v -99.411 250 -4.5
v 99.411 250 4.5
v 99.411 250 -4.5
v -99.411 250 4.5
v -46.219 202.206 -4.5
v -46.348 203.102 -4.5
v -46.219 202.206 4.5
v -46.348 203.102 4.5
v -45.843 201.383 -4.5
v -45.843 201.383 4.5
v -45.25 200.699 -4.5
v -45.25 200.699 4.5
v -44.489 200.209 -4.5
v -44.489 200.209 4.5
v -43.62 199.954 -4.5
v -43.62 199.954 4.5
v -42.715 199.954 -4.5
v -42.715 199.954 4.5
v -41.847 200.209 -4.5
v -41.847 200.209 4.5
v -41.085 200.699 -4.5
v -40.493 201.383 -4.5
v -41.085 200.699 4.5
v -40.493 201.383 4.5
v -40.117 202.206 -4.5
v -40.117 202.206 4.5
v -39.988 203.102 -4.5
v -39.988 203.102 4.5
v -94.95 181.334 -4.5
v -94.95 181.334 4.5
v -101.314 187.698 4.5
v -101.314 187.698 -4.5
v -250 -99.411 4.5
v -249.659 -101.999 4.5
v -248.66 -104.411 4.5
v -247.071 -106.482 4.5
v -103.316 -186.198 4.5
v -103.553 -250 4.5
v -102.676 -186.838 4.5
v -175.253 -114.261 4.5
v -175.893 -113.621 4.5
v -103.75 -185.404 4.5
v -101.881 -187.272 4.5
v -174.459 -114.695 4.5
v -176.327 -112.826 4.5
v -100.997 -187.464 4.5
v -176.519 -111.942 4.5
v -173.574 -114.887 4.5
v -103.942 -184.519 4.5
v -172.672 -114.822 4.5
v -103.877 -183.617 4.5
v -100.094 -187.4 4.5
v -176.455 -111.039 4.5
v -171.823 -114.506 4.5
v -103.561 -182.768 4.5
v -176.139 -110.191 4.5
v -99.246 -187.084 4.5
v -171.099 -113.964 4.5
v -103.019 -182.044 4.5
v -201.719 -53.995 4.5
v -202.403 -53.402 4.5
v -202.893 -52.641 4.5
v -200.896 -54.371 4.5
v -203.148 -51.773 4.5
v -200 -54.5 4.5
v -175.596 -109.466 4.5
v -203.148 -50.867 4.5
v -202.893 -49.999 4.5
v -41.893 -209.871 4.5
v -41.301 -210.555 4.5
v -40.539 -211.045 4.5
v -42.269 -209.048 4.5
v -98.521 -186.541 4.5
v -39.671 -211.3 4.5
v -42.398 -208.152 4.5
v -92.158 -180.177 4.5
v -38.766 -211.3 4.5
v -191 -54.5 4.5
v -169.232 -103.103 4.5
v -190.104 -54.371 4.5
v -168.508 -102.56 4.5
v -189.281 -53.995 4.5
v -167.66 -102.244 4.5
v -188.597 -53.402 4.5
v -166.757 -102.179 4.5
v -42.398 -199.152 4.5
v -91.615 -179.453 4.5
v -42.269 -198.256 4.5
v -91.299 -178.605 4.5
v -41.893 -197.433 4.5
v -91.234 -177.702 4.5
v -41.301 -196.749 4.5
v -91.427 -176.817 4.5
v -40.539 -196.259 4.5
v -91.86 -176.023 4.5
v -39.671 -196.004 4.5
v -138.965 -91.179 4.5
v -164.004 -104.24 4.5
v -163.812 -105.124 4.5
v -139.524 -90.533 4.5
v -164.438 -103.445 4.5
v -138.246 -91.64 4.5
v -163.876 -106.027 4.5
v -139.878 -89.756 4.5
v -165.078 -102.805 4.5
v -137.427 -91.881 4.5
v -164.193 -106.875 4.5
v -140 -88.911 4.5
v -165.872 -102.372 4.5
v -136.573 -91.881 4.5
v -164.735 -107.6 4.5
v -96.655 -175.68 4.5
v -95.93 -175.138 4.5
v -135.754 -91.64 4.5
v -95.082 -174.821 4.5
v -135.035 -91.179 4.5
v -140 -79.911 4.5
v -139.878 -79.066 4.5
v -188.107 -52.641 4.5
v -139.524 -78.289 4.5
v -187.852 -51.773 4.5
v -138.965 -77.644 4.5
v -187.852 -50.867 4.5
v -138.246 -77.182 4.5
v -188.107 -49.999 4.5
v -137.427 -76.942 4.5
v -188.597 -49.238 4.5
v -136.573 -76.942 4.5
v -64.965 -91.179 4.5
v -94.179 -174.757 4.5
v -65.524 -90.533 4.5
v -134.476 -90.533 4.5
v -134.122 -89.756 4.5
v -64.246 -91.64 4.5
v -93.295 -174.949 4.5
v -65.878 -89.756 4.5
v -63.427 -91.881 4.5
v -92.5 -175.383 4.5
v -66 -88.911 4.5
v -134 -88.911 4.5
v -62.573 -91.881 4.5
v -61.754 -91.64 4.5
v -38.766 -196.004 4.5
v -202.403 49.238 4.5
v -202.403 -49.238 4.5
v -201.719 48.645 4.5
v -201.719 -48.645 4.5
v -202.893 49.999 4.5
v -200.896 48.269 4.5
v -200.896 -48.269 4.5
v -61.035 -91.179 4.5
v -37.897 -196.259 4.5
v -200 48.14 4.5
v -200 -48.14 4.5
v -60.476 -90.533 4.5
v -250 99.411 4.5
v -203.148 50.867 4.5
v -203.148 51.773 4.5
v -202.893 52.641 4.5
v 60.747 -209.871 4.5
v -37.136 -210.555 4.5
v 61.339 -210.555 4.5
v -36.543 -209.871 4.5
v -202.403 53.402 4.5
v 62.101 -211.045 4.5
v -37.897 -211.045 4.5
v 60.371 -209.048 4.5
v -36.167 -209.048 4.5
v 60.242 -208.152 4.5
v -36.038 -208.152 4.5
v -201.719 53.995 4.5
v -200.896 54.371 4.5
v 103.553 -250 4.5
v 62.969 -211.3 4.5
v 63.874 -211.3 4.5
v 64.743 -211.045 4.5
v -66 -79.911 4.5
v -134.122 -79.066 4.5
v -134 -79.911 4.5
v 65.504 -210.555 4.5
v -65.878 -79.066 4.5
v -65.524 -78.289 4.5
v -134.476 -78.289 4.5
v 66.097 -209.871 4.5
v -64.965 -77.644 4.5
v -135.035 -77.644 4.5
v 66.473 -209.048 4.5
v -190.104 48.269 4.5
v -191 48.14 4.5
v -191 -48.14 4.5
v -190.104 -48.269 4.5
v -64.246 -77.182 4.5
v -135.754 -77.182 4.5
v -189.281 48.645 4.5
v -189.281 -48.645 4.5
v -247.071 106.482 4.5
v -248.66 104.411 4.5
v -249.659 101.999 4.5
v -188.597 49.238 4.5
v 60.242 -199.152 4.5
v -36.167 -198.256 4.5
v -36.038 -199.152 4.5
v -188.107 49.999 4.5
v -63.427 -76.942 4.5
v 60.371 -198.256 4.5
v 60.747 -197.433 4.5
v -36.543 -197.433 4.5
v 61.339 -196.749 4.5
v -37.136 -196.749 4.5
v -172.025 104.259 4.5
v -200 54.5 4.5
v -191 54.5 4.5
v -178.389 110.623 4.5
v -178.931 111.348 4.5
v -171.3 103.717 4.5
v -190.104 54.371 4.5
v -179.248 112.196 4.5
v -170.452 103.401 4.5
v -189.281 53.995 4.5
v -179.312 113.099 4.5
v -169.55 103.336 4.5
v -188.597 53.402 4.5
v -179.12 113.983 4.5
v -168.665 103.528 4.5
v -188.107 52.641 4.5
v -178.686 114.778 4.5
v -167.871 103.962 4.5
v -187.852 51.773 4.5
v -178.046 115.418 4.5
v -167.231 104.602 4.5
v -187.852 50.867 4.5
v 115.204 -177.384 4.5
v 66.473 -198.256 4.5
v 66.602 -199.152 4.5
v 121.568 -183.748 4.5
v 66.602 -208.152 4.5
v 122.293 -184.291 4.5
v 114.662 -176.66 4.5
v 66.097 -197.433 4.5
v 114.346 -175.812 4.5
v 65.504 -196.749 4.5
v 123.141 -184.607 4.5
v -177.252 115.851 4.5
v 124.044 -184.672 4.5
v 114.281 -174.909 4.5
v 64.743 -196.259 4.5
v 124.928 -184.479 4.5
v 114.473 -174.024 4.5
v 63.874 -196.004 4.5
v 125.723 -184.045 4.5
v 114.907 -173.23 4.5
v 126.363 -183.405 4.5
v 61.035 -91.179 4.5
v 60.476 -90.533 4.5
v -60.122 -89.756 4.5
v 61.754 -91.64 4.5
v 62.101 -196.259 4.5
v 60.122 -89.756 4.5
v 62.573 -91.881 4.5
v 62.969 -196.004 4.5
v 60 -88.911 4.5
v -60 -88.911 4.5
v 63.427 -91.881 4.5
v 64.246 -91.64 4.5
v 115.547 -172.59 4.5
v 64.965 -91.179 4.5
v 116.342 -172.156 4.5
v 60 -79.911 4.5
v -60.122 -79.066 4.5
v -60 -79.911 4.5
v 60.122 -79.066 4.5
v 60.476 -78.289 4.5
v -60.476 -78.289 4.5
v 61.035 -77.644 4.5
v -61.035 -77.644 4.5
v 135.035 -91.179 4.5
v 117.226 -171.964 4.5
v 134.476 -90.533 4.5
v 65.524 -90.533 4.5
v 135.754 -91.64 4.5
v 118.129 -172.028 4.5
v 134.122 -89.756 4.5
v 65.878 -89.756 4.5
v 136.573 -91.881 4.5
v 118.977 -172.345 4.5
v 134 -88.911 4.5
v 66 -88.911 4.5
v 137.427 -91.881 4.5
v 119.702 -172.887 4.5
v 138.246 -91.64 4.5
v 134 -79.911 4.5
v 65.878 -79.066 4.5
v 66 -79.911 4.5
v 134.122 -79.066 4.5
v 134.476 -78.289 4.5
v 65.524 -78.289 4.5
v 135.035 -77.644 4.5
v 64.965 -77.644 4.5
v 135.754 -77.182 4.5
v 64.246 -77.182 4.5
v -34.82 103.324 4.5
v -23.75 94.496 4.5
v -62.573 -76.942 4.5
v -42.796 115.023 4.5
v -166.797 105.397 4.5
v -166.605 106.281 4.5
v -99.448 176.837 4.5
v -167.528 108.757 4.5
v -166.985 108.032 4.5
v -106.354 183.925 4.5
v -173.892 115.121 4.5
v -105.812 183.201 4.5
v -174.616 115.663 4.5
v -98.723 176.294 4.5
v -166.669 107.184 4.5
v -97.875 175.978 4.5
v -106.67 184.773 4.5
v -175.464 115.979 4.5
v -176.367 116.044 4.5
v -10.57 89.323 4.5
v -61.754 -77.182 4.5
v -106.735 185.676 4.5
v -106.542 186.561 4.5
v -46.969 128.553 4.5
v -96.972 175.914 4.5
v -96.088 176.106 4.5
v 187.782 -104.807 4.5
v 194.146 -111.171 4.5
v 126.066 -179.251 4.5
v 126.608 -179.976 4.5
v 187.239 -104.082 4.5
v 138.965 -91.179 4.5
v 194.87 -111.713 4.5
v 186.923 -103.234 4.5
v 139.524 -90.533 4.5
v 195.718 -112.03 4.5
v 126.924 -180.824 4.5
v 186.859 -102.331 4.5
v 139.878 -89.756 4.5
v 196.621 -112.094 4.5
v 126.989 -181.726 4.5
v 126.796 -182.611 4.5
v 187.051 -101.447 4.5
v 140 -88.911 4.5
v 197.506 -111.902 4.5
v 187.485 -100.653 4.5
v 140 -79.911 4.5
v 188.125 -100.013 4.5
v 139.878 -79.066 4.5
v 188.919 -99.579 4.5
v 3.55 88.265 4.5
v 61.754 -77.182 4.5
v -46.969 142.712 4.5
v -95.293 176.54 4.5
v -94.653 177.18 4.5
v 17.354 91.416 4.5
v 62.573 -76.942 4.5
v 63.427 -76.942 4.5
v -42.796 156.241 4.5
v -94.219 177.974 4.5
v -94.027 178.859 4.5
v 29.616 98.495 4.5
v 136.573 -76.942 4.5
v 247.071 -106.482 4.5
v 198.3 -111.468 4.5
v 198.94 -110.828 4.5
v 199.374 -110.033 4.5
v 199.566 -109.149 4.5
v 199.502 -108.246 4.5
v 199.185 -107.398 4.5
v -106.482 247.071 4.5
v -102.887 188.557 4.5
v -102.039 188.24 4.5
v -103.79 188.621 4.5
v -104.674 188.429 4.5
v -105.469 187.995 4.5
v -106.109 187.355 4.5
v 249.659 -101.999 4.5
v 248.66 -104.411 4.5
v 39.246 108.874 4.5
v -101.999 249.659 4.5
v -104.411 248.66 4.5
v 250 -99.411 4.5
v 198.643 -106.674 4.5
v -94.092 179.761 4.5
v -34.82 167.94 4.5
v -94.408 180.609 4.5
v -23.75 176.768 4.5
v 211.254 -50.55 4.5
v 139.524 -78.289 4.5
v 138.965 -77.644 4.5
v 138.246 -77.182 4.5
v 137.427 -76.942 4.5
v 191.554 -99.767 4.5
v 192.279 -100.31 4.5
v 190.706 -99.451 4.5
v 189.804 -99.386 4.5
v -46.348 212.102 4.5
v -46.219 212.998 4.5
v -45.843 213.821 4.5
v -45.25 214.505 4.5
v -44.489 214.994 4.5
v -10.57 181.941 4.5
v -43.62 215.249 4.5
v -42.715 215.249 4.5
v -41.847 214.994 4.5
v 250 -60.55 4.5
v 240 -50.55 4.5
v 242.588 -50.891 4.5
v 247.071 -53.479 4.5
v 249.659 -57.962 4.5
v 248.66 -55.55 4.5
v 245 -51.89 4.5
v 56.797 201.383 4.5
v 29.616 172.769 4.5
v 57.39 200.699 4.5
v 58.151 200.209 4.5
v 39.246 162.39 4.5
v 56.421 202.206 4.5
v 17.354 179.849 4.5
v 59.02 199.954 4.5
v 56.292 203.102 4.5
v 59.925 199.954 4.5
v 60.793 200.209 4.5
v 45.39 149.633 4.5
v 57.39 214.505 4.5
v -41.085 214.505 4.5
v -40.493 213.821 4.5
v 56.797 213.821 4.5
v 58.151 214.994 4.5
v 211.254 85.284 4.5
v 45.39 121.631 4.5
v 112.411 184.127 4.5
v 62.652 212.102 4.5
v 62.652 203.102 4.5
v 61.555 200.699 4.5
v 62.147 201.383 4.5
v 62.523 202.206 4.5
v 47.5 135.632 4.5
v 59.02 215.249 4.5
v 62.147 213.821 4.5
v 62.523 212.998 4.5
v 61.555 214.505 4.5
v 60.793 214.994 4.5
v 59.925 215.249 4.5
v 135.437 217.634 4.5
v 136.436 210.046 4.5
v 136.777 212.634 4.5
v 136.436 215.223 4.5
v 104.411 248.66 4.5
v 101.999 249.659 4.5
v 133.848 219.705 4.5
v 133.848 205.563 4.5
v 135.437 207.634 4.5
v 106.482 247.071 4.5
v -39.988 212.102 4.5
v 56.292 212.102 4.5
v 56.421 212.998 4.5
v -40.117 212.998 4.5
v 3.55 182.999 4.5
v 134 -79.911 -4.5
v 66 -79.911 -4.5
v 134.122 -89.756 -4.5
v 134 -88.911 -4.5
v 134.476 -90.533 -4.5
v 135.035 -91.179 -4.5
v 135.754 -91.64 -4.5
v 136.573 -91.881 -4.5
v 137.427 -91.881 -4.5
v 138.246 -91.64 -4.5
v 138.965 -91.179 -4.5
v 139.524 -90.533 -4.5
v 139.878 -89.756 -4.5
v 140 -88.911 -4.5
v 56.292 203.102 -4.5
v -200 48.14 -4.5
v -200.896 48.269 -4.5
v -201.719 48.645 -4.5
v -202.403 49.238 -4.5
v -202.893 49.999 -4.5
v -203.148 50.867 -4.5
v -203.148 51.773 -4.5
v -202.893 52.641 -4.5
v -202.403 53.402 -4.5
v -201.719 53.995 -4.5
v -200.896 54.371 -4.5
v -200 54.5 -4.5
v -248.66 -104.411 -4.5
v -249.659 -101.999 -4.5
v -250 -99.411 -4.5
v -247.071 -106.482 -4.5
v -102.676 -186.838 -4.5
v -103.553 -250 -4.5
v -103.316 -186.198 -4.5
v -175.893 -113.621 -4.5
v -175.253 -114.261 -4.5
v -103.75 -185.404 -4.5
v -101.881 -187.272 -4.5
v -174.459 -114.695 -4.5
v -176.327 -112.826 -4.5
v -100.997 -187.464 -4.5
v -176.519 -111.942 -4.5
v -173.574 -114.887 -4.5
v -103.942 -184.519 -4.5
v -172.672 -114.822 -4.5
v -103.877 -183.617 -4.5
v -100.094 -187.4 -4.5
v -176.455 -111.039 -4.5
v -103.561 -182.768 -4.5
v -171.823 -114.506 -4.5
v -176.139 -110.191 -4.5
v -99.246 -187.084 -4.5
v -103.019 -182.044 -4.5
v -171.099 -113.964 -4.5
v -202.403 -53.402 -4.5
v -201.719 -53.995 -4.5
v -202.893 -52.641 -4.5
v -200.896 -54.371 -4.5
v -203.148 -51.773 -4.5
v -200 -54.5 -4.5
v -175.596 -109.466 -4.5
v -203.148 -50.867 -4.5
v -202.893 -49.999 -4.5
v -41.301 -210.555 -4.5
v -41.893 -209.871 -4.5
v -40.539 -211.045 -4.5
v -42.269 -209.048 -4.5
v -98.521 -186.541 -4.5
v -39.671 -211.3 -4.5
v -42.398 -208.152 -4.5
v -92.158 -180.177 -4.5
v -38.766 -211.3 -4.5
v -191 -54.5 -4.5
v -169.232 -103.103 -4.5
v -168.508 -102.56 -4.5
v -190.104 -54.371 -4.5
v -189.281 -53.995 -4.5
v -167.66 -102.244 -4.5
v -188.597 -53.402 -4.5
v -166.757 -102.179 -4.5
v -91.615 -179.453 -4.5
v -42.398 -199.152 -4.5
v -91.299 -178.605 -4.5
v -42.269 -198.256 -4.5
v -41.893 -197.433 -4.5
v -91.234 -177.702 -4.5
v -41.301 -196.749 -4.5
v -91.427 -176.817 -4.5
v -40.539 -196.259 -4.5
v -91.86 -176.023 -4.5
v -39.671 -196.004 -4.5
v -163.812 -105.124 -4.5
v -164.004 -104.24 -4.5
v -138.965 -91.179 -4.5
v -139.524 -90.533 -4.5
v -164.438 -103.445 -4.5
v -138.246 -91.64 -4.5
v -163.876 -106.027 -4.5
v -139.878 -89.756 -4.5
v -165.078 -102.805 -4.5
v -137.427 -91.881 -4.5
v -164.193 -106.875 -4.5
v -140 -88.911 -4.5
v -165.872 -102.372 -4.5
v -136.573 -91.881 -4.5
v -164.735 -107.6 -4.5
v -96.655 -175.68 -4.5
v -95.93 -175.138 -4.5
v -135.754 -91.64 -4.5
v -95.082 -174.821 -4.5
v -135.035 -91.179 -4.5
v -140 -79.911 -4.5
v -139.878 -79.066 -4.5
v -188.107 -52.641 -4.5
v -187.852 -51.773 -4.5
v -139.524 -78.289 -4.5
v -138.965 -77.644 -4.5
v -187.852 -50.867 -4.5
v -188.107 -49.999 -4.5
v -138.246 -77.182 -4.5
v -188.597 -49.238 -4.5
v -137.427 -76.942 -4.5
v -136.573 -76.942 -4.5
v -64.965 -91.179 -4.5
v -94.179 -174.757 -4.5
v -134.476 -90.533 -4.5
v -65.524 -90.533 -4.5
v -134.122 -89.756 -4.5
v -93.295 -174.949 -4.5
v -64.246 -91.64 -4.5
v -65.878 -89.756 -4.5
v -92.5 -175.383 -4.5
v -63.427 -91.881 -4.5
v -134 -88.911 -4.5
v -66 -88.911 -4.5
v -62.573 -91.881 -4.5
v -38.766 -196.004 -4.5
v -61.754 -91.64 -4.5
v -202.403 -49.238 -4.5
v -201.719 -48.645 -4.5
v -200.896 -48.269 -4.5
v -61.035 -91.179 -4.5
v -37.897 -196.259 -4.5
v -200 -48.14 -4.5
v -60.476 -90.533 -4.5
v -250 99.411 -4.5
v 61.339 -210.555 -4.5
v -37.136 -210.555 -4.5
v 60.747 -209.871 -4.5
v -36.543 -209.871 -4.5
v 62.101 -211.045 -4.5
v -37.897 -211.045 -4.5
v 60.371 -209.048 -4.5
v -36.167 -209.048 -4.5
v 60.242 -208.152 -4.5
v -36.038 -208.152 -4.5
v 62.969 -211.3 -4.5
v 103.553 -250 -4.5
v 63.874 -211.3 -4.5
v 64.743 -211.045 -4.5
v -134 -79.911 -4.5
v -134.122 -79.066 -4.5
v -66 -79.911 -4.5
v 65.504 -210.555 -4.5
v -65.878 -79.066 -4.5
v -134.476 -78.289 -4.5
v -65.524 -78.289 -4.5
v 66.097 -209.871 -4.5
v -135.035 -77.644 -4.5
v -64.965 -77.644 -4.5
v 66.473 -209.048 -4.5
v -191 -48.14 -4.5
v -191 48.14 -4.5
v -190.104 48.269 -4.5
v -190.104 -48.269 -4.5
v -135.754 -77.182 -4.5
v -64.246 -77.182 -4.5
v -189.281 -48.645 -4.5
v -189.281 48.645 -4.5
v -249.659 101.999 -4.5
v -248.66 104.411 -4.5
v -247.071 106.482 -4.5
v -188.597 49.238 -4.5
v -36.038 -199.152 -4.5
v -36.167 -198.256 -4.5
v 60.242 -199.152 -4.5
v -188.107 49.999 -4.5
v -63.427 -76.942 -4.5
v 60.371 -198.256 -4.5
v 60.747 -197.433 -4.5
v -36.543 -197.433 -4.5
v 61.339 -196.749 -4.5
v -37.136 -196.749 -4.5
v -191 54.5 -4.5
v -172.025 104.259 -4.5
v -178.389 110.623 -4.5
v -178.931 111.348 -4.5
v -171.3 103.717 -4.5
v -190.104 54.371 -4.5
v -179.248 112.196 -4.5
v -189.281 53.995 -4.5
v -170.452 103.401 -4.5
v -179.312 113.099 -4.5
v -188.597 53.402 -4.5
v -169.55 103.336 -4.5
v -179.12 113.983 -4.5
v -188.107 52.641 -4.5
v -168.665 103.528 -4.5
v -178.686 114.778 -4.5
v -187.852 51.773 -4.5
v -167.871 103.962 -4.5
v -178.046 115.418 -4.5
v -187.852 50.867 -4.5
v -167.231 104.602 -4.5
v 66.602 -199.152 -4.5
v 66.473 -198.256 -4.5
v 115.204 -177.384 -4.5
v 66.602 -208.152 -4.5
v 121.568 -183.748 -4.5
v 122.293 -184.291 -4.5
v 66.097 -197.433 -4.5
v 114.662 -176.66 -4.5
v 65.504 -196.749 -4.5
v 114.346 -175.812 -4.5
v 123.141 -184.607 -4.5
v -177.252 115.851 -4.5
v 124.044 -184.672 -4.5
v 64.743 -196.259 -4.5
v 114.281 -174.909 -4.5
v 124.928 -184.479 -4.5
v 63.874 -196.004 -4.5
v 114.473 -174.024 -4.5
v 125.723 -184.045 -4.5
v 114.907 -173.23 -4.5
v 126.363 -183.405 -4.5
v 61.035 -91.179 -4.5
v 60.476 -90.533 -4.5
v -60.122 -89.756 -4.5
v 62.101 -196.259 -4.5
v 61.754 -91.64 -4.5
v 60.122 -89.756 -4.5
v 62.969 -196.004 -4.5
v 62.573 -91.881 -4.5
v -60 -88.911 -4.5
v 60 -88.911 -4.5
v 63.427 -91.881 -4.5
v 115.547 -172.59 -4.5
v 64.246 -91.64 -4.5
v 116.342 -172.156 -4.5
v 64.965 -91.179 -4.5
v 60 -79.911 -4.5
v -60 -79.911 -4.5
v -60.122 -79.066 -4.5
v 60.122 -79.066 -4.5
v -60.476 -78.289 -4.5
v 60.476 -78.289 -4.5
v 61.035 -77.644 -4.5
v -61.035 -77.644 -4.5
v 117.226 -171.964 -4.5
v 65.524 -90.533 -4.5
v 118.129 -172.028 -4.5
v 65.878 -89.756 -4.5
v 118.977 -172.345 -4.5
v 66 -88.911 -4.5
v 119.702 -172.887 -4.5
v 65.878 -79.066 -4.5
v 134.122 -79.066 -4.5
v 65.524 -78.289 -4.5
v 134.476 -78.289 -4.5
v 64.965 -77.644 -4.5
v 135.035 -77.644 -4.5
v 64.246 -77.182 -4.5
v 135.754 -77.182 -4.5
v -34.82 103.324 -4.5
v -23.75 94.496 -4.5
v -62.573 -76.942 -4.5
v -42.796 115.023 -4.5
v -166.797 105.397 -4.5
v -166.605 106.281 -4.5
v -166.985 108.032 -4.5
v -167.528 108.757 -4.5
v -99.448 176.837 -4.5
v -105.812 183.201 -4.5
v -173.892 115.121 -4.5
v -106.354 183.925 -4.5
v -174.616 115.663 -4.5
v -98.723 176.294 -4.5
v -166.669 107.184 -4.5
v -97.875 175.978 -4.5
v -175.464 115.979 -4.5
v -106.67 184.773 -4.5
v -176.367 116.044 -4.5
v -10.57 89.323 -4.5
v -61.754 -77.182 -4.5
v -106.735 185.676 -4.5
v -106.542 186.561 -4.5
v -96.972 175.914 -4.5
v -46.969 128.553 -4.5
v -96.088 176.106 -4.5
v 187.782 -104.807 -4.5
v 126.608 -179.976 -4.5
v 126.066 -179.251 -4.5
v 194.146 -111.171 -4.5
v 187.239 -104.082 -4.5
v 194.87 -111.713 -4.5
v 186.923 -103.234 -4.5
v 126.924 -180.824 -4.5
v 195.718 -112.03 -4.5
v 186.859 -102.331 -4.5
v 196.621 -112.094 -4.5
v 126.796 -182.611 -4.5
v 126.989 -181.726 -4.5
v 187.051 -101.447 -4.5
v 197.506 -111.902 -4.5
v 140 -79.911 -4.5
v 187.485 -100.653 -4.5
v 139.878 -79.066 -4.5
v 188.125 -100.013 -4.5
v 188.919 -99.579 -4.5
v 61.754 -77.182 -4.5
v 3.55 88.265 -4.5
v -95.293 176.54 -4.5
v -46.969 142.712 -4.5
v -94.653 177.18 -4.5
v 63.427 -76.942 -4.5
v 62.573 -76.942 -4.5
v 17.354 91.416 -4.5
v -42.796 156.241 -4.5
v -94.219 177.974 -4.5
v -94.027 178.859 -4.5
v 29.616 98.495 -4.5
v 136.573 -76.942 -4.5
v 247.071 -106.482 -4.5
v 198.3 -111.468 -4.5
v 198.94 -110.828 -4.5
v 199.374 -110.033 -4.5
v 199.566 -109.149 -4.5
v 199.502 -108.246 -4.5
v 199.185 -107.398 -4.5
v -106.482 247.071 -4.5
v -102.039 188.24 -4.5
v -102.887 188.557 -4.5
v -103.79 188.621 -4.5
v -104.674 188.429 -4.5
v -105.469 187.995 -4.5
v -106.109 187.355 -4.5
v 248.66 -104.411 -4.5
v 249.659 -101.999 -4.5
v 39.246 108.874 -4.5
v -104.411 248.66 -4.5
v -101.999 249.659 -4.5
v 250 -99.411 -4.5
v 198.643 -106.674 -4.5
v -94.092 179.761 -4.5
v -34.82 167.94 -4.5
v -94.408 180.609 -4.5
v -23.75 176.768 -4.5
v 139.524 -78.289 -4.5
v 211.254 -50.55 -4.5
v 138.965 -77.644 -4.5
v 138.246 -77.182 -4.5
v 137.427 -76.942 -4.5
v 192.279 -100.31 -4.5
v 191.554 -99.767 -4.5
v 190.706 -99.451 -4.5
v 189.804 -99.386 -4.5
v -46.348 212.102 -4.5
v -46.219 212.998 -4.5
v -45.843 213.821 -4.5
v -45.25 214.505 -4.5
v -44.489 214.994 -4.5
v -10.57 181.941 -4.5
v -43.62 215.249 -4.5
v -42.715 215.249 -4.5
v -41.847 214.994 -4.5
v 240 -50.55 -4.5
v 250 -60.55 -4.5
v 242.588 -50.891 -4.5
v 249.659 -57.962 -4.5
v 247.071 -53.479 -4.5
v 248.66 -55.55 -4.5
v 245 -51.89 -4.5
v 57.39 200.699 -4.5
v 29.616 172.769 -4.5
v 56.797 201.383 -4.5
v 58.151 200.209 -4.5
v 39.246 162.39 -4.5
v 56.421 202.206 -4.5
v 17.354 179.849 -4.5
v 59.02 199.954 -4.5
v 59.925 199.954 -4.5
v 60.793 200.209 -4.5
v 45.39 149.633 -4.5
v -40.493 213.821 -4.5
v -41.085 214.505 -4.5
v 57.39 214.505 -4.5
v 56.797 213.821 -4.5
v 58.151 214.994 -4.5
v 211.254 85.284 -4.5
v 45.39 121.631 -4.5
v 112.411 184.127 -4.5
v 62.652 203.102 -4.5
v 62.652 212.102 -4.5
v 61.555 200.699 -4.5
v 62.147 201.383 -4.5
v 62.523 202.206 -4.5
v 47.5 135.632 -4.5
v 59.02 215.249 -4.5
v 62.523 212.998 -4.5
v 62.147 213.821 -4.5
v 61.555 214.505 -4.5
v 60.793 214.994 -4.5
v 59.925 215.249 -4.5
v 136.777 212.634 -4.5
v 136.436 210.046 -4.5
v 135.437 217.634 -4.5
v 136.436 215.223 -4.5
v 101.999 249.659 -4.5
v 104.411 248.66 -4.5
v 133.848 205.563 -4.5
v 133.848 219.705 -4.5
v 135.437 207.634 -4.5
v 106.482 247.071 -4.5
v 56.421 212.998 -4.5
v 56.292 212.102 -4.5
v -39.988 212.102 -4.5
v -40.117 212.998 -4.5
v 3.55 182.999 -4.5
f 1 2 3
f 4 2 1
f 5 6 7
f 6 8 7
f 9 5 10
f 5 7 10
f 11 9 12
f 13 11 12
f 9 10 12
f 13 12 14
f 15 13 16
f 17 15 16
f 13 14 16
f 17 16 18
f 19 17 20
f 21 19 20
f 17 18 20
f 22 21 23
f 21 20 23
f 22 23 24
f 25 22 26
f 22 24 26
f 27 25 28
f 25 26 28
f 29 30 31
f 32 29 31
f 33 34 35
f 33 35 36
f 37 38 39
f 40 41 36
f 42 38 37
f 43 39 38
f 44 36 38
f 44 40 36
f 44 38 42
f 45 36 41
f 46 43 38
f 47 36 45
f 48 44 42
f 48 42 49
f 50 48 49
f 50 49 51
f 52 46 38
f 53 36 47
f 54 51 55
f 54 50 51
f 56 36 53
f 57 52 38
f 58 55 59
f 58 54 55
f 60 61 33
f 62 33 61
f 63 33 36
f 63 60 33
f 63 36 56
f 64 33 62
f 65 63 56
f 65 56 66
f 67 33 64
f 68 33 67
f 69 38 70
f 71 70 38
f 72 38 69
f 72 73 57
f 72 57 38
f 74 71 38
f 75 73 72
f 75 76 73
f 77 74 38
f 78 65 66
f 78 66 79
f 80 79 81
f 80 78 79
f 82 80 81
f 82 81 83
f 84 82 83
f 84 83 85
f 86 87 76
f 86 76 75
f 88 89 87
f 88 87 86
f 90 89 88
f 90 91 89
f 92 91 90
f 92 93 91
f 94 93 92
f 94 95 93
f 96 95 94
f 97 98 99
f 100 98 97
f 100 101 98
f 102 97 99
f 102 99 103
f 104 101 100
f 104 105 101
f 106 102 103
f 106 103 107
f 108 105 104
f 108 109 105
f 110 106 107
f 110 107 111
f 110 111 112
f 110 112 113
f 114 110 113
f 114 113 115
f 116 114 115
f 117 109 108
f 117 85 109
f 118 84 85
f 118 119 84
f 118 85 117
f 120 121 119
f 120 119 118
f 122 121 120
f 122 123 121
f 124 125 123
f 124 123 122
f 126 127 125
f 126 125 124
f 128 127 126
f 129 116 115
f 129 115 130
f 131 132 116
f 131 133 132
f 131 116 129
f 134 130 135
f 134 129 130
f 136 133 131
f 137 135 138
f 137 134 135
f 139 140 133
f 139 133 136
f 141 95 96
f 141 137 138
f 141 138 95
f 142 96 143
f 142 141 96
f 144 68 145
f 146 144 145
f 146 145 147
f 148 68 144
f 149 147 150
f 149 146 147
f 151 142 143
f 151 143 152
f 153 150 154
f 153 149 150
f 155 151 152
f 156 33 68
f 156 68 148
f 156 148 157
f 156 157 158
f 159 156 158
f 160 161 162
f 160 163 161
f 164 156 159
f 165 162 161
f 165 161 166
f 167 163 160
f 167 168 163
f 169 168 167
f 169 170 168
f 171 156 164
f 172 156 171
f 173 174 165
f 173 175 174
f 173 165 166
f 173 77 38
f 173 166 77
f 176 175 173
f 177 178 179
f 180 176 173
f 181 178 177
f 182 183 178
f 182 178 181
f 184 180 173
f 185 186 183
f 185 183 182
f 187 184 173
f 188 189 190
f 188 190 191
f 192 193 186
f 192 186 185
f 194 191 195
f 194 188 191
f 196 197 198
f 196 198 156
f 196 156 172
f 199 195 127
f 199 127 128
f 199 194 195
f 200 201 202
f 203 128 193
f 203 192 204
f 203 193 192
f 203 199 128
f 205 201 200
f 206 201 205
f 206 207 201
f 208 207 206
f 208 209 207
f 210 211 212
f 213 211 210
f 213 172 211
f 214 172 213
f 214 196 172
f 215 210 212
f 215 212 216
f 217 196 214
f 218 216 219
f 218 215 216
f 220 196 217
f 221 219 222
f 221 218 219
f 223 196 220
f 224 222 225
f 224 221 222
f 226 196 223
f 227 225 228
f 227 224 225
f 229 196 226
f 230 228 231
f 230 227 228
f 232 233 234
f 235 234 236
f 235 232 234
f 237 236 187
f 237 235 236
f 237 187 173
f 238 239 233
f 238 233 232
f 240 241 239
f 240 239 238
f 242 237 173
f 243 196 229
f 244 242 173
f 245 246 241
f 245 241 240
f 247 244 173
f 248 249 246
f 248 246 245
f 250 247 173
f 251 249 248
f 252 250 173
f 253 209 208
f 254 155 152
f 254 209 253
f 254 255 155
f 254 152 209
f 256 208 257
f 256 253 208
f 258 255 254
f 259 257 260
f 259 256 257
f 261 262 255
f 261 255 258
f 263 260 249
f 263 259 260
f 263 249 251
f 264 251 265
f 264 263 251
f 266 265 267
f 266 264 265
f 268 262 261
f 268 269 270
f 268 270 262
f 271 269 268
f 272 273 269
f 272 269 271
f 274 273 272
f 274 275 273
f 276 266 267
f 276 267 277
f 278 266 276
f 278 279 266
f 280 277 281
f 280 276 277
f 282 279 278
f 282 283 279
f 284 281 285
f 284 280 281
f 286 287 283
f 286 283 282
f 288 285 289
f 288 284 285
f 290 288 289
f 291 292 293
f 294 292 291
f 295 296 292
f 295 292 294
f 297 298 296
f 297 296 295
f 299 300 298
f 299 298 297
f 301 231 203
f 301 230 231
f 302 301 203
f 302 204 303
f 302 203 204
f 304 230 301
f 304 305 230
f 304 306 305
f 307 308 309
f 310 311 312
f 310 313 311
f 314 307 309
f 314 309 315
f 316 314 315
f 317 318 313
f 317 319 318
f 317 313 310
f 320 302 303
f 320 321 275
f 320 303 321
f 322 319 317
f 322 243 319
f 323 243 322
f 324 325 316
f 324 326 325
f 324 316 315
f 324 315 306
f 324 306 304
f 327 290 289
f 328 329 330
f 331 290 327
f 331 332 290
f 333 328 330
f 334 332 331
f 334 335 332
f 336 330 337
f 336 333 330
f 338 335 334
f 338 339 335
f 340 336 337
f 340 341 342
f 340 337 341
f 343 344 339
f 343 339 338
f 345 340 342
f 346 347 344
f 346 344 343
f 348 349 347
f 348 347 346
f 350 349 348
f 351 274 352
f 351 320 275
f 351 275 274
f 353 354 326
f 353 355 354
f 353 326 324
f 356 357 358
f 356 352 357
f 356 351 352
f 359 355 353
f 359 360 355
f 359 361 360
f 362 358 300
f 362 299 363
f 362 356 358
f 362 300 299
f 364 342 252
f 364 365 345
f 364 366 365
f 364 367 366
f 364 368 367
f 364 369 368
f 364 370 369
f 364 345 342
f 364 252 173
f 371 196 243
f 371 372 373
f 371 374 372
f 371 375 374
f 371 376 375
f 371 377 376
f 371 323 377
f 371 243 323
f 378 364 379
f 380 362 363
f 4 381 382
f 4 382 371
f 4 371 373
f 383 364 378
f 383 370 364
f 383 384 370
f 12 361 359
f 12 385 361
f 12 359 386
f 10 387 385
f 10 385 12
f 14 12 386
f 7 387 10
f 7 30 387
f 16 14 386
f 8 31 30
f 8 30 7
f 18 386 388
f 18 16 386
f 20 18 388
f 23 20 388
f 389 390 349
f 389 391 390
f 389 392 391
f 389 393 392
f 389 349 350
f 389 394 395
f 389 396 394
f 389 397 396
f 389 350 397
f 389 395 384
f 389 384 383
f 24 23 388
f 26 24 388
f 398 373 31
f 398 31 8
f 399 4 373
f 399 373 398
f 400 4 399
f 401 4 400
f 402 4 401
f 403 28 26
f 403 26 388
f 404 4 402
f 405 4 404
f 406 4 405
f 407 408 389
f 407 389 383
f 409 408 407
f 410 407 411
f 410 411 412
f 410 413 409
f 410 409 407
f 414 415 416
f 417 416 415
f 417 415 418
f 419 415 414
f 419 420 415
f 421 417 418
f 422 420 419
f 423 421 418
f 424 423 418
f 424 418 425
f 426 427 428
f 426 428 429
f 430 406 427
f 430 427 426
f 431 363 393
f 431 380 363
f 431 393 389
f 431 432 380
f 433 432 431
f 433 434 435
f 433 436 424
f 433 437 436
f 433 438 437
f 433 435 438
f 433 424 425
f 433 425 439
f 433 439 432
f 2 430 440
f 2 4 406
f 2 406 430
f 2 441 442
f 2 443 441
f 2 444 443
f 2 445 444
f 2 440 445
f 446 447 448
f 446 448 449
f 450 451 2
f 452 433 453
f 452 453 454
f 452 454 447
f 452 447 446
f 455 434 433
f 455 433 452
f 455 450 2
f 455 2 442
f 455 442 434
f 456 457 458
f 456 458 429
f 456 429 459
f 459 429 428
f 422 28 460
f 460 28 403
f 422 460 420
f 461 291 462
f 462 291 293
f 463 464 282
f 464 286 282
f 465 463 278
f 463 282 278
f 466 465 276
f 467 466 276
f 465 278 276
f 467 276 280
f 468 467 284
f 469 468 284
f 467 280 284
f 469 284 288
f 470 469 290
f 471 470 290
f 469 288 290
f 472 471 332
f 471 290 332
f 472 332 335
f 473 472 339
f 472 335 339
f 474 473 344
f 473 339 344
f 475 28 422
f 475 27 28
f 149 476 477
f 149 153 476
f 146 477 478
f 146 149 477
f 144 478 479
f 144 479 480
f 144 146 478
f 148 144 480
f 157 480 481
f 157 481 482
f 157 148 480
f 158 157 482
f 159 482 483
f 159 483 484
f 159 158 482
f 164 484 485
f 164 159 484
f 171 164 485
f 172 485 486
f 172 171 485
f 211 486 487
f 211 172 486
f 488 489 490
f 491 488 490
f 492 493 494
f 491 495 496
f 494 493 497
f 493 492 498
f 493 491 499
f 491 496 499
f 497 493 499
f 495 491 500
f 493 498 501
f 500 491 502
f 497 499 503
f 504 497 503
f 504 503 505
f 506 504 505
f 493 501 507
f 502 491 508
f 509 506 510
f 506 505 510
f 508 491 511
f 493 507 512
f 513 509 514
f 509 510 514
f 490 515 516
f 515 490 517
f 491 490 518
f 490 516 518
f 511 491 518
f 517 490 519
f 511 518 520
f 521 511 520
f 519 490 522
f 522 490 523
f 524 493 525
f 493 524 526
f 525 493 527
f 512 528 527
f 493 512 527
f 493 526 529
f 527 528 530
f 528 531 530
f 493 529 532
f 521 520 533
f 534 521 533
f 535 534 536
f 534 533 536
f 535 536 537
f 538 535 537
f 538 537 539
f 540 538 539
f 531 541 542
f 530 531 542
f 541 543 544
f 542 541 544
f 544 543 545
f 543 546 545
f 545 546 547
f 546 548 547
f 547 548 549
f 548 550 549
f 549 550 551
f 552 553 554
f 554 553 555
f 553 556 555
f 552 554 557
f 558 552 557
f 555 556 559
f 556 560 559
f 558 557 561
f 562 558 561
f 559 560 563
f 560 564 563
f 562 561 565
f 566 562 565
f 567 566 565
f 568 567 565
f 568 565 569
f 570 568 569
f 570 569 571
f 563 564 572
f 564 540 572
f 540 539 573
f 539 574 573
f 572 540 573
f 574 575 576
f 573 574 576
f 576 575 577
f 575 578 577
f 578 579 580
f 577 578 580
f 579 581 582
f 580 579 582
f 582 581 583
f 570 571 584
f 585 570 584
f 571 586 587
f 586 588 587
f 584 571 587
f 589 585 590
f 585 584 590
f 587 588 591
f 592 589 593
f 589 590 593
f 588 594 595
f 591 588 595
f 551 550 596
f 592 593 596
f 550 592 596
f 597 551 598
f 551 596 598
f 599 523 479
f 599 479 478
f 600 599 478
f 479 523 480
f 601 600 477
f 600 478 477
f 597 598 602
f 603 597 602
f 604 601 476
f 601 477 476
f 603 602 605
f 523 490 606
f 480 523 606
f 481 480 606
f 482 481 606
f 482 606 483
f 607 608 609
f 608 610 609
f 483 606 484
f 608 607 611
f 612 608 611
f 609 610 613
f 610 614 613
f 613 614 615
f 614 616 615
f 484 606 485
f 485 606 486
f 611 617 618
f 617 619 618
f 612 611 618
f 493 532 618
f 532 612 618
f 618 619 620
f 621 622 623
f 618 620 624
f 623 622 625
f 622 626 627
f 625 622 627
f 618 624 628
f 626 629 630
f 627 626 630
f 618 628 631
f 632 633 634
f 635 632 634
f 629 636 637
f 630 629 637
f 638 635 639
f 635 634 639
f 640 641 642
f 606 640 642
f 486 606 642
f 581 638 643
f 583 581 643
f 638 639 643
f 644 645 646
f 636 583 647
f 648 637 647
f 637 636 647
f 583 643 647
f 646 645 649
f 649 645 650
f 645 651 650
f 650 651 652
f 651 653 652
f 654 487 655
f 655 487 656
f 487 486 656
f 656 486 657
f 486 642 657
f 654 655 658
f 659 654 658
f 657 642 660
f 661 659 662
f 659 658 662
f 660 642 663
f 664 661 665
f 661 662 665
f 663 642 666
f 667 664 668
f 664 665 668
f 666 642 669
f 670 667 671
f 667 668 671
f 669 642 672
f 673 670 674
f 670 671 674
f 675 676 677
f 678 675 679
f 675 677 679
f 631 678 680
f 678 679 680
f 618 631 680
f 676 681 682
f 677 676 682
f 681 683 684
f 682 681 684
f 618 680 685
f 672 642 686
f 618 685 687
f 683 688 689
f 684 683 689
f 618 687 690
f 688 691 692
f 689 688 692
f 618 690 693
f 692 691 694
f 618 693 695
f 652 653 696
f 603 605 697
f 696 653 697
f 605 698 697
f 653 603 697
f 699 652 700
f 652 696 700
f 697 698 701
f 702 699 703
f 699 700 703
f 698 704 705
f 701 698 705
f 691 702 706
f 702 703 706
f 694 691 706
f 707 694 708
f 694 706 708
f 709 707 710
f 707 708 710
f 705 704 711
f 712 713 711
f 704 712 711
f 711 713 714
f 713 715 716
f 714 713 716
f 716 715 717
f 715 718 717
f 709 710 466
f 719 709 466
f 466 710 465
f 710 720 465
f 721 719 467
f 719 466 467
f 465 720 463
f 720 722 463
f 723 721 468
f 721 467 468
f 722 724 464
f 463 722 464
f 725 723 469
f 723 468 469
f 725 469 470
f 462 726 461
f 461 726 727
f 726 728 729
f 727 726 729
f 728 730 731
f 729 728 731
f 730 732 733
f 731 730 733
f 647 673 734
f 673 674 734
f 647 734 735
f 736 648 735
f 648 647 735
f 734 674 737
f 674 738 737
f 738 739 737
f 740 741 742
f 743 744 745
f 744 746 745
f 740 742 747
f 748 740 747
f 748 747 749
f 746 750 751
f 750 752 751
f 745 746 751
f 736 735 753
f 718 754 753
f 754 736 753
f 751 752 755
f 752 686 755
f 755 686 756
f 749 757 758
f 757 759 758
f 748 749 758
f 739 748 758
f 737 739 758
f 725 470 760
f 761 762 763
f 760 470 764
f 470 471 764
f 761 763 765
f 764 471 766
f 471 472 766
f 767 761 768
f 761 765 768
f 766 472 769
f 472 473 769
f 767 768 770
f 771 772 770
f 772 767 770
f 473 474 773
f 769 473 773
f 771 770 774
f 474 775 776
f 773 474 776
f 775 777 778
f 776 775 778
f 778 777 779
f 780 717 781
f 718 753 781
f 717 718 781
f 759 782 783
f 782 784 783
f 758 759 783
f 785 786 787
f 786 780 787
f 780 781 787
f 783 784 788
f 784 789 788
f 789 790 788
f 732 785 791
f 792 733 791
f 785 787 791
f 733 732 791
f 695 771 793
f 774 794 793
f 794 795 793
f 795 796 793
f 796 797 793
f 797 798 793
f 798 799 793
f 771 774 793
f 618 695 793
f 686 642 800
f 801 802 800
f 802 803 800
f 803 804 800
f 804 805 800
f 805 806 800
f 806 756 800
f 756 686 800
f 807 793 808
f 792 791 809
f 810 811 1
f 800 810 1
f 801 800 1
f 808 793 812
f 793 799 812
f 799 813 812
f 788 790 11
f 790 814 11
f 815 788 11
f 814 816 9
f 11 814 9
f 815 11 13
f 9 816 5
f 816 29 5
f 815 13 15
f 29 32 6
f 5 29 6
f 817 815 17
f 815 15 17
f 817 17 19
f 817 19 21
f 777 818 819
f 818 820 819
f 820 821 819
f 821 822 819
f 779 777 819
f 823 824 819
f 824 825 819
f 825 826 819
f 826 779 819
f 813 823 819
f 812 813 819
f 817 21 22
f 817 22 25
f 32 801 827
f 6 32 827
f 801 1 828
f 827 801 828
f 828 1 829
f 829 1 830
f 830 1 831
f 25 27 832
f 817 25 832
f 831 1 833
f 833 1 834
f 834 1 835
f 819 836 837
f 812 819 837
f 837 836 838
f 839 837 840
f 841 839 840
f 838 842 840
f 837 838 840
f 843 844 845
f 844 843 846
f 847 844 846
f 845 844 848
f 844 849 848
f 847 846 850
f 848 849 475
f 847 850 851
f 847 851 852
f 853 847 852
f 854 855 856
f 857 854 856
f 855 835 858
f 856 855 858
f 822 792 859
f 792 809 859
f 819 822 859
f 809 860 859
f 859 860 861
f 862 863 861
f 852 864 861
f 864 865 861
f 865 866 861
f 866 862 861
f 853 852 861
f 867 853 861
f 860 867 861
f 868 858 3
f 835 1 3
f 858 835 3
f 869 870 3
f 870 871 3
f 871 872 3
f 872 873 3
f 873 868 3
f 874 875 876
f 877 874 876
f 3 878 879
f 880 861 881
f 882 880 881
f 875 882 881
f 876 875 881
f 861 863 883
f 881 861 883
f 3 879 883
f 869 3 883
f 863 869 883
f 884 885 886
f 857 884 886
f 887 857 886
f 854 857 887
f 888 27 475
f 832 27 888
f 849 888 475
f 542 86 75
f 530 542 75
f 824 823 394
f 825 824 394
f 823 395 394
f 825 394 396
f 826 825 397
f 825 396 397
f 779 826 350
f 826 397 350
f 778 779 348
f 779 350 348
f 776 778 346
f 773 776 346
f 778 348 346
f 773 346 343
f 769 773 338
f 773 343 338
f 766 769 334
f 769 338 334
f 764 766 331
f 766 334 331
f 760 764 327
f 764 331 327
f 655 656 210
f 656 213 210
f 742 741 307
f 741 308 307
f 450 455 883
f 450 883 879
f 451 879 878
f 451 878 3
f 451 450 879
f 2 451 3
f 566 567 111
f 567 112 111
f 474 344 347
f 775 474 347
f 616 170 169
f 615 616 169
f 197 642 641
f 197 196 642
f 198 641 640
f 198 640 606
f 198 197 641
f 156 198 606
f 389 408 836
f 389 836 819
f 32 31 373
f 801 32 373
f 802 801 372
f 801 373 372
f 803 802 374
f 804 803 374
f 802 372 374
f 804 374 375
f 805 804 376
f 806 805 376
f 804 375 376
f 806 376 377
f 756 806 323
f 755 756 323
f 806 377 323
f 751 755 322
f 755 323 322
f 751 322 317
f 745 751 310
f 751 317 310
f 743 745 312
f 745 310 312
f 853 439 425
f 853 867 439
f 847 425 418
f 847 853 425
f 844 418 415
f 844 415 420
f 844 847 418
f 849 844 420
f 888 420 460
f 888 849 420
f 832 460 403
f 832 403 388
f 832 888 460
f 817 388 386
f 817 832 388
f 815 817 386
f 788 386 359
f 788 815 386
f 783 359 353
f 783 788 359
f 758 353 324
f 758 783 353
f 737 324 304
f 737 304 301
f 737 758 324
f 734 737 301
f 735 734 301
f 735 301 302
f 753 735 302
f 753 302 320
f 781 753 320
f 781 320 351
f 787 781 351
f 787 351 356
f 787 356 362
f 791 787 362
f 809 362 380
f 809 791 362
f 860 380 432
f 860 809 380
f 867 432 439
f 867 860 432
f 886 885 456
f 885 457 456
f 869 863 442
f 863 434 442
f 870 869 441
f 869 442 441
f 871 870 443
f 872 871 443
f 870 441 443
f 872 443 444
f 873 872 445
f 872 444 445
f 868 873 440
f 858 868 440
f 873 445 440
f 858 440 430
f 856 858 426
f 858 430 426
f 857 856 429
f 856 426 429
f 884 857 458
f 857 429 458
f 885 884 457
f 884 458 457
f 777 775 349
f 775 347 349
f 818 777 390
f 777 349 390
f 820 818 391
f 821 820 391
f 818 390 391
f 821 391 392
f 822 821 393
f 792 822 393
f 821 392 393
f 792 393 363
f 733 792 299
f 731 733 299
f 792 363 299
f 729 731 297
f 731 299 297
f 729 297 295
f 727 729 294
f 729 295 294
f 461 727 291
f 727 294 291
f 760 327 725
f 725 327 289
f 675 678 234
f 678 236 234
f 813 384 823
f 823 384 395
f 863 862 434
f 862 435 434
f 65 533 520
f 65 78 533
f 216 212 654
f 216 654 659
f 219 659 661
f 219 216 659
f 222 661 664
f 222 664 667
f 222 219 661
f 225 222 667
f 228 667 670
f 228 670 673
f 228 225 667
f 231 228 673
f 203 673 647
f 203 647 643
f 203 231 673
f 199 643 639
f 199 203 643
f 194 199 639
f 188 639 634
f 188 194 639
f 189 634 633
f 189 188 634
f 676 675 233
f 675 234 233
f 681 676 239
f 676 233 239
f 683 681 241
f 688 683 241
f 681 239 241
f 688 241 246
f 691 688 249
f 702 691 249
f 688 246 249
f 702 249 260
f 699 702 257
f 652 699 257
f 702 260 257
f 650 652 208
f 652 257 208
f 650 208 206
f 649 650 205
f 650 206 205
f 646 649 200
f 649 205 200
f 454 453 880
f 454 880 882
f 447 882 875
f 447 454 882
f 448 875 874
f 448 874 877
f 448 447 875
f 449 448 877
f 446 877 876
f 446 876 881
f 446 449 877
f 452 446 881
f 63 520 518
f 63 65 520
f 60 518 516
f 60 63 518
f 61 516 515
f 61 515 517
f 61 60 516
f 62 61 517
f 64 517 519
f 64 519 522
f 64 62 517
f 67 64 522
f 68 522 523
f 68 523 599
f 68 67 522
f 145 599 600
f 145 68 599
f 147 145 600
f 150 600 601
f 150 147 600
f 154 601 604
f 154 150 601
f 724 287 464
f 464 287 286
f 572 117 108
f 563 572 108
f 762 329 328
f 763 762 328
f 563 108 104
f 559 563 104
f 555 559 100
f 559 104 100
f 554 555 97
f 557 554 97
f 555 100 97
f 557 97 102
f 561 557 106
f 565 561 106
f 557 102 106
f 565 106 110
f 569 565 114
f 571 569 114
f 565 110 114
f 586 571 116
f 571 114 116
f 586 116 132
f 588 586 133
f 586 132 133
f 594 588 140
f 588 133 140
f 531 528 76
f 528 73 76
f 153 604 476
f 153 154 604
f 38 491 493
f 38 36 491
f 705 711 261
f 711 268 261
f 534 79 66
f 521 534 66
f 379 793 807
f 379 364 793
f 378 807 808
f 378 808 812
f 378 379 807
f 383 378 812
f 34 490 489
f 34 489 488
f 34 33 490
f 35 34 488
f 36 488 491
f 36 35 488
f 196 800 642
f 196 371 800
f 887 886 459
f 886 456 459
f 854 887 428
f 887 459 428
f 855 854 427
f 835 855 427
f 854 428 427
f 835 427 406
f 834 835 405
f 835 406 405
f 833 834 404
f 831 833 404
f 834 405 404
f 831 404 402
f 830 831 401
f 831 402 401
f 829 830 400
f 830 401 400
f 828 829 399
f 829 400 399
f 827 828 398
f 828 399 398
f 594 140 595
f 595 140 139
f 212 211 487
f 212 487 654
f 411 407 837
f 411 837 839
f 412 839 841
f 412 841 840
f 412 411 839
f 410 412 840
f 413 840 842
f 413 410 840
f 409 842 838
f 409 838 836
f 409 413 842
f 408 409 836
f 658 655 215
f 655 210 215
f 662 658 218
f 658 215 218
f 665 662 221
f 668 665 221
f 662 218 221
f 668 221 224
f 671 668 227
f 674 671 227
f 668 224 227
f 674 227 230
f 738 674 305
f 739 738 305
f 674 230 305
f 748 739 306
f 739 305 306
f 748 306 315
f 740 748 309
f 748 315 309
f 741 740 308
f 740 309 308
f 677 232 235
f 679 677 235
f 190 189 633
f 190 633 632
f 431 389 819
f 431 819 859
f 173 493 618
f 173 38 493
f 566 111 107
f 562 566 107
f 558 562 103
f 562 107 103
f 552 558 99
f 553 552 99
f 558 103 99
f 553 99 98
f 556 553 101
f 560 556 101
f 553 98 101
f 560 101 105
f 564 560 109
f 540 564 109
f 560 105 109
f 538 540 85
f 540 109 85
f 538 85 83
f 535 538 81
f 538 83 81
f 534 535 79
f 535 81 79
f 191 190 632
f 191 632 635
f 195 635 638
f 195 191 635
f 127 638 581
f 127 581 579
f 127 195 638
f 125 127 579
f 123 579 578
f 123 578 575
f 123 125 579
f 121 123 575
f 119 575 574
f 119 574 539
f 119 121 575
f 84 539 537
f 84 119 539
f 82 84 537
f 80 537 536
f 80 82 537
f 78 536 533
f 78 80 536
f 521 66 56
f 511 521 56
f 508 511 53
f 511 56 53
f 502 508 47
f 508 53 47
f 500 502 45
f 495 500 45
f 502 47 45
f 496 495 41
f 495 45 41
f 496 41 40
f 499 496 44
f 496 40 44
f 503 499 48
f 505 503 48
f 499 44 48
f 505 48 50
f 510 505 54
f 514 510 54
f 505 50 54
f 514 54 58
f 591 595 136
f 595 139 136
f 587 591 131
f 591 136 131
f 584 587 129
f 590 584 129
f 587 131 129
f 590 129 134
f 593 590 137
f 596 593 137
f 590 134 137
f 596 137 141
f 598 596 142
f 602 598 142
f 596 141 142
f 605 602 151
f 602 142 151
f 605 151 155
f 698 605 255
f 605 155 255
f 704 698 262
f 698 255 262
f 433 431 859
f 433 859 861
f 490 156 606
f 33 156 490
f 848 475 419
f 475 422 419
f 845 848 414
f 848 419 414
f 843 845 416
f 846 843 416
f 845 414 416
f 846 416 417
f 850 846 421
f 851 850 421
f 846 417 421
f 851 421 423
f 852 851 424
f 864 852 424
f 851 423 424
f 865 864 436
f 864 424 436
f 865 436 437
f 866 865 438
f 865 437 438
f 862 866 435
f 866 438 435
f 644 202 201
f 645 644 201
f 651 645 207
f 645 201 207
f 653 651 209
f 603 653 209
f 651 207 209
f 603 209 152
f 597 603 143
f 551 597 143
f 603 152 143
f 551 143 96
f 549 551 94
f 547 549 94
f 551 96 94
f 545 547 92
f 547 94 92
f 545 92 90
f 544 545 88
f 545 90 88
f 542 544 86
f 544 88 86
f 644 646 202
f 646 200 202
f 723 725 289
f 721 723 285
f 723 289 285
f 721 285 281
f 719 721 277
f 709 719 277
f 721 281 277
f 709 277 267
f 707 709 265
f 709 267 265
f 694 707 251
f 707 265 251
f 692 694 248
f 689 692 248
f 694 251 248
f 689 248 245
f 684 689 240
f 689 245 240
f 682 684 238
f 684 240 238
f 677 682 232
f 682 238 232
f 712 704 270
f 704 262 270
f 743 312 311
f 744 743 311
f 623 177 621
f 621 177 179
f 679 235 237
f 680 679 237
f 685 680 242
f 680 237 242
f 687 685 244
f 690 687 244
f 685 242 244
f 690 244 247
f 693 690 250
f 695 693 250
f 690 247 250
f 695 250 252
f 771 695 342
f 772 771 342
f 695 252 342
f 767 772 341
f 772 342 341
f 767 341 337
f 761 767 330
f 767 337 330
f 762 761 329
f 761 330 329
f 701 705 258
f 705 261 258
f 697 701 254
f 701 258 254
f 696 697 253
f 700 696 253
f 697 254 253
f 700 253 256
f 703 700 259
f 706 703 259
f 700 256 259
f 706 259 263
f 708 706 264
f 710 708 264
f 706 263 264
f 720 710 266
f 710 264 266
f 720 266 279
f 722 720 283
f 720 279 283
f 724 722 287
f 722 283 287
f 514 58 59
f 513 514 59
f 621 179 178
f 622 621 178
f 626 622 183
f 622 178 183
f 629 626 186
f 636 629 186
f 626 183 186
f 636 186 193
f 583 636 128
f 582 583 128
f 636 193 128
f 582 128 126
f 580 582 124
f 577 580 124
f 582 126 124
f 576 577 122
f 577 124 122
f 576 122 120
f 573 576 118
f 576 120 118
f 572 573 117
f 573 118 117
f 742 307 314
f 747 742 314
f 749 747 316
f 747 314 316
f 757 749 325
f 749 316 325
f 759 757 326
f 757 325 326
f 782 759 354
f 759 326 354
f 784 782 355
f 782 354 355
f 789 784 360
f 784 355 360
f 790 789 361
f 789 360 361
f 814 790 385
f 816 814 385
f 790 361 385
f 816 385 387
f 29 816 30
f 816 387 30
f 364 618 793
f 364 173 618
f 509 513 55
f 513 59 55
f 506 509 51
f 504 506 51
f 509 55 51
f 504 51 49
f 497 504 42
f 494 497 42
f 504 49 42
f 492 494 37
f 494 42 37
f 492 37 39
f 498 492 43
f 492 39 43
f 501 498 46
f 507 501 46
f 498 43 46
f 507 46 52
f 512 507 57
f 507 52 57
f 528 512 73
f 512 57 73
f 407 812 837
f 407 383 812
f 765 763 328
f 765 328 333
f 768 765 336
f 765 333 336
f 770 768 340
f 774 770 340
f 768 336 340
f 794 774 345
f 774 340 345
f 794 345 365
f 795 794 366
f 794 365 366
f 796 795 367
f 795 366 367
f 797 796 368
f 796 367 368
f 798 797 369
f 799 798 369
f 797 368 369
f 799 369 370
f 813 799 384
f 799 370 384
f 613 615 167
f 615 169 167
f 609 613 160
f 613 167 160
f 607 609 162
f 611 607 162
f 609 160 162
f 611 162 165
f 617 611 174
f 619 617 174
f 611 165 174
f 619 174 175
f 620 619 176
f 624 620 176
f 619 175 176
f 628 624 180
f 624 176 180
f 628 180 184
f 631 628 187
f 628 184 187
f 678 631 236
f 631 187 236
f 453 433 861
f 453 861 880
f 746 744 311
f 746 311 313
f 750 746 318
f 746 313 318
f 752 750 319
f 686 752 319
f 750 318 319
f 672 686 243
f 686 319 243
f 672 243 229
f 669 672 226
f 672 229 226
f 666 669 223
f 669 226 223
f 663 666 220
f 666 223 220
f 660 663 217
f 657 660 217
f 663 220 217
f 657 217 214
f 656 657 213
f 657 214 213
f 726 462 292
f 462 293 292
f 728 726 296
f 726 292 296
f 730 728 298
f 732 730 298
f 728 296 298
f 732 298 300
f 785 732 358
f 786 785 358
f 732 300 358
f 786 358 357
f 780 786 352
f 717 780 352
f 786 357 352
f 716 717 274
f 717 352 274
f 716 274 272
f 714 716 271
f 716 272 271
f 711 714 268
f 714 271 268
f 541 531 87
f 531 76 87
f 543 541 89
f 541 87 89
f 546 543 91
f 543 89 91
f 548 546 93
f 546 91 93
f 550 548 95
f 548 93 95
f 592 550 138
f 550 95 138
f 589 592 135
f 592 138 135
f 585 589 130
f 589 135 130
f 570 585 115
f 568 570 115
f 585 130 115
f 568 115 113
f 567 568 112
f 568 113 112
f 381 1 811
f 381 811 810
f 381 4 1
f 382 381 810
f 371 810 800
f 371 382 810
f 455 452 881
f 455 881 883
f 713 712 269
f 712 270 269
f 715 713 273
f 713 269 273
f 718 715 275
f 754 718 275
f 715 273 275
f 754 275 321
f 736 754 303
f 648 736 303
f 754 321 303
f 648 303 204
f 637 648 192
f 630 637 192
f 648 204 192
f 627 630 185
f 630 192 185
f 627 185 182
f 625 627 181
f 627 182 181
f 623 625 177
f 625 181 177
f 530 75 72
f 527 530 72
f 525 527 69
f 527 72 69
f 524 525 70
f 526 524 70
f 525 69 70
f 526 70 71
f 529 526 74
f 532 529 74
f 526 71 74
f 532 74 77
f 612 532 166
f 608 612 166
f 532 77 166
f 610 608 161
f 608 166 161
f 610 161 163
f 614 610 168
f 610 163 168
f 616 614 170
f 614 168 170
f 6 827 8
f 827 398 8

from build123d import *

# Parameters (mm, degrees)
SKETCH1_R           = 47.5
BOSS_EXTRUDE1_DEPTH = 4.5


with BuildPart() as part:
    # Sketch1 → Boss-Extrude1 (new body, symmetric)
    with BuildSketch(Plane.XY):
        with BuildLine():
            Line((250, -99.41125497), (250, -60.550262484))
            ThreePointArc((250, -60.550262484), (247.071067812, -53.479194672), (240, -50.550262484))
            Line((240, -50.550262484), (211.253965719, -50.550262484))
            Line((211.253965719, -50.550262484), (211.253965719, 85.284392818))
            Line((211.253965719, 85.284392818), (112.411473654, 184.126884883))
            Line((112.411473654, 184.126884883), (133.84792187, 205.563333099))
            ThreePointArc((133.84792187, 205.563333099), (136.776854058, 212.634400911), (133.84792187, 219.705468723))
            Line((133.84792187, 219.705468723), (106.482322781, 247.071067812))
            ThreePointArc((106.482322781, 247.071067812), (103.238089293, 249.238795325), (99.41125497, 250))
            Line((99.41125497, 250), (-99.41125497, 250))
            ThreePointArc((-99.41125497, 250), (-103.238089293, 249.238795325), (-106.482322781, 247.071067812))
            Line((-106.482322781, 247.071067812), (-247.071067812, 106.482322781))
            ThreePointArc((-247.071067812, 106.482322781), (-249.238795325, 103.238089293), (-250, 99.41125497))
            Line((-250, 99.41125497), (-250, -99.41125497))
            ThreePointArc((-250, -99.41125497), (-249.238795325, -103.238089293), (-247.071067812, -106.482322781))
            Line((-247.071067812, -106.482322781), (-103.553390593, -250))
            Line((-103.553390593, -250), (103.553390593, -250))
            Line((103.553390593, -250), (247.071067812, -106.482322781))
            ThreePointArc((247.071067812, -106.482322781), (249.238795325, -103.238089293), (250, -99.41125497))
        make_face()
        with Locations((0, 135.632011386)):
            Circle(SKETCH1_R, mode=Mode.SUBTRACT)
        with BuildLine():
            Line((-200, 54.5), (-191, 54.5))
            ThreePointArc((-191, 54.5), (-187.82, 51.32), (-191, 48.14))
            Line((-191, 48.14), (-191, -48.14))
            ThreePointArc((-191, -48.14), (-187.82, -51.32), (-191, -54.5))
            Line((-191, -54.5), (-200, -54.5))
            ThreePointArc((-200, -54.5), (-203.18, -51.32), (-200, -48.14))
            Line((-200, -48.14), (-200, 48.14))
            ThreePointArc((-200, 48.14), (-203.18, 51.32), (-200, 54.5))
        make_face(mode=Mode.SUBTRACT)
        with BuildLine():
            Line((-105.811554275, 183.200760604), (-173.891795168, 115.120519711))
            ThreePointArc((-173.891795168, 115.120519711), (-178.388994296, 115.120519711), (-178.388994296, 110.623320583))
            Line((-178.388994296, 110.623320583), (-172.025033265, 104.259359552))
            ThreePointArc((-172.025033265, 104.259359552), (-167.527834137, 104.259359552), (-167.527834137, 108.756558681))
            Line((-167.527834137, 108.756558681), (-99.447593244, 176.836799573))
            ThreePointArc((-99.447593244, 176.836799573), (-94.950394116, 176.836799573), (-94.950394116, 181.333998701))
            Line((-94.950394116, 181.333998701), (-101.314355147, 187.697959732))
            ThreePointArc((-101.314355147, 187.697959732), (-105.811554275, 187.697959732), (-105.811554275, 183.200760604))
        make_face(mode=Mode.SUBTRACT)
        with BuildLine():
            Line((56.292114102, 212.101851618), (-39.987885898, 212.101851618))
            ThreePointArc((-39.987885898, 212.101851618), (-43.167885898, 215.281851618), (-46.347885898, 212.101851618))
            Line((-46.347885898, 212.101851618), (-46.347885898, 203.101851618))
            ThreePointArc((-46.347885898, 203.101851618), (-43.167885898, 199.921851618), (-39.987885898, 203.101851618))
            Line((-39.987885898, 203.101851618), (56.292114102, 203.101851618))
            ThreePointArc((56.292114102, 203.101851618), (59.472114102, 199.921851618), (62.652114102, 203.101851618))
            Line((62.652114102, 203.101851618), (62.652114102, 212.101851618))
            ThreePointArc((62.652114102, 212.101851618), (59.472114102, 215.281851618), (56.292114102, 212.101851618))
        make_face(mode=Mode.SUBTRACT)
        with BuildLine():
            Line((126.065519994, -179.251023088), (194.145760887, -111.170782195))
            ThreePointArc((194.145760887, -111.170782195), (198.642960015, -111.170782195), (198.642960015, -106.673583067))
            Line((198.642960015, -106.673583067), (192.278998984, -100.309622036))
            ThreePointArc((192.278998984, -100.309622036), (187.781799856, -100.309622036), (187.781799856, -104.806821165))
            Line((187.781799856, -104.806821165), (119.701558963, -172.887062057))
            ThreePointArc((119.701558963, -172.887062057), (115.204359835, -172.887062057), (115.204359835, -177.384261185))
            Line((115.204359835, -177.384261185), (121.568320866, -183.748222216))
            ThreePointArc((121.568320866, -183.748222216), (126.065519994, -183.748222216), (126.065519994, -179.251023088))
        make_face(mode=Mode.SUBTRACT)
        with BuildLine():
            Line((-36.038148382, -208.152114102), (60.241851618, -208.152114102))
            ThreePointArc((60.241851618, -208.152114102), (63.421851618, -211.332114102), (66.601851618, -208.152114102))
            Line((66.601851618, -208.152114102), (66.601851618, -199.152114102))
            ThreePointArc((66.601851618, -199.152114102), (63.421851618, -195.972114102), (60.241851618, -199.152114102))
            Line((60.241851618, -199.152114102), (-36.038148382, -199.152114102))
            ThreePointArc((-36.038148382, -199.152114102), (-39.218148382, -195.972114102), (-42.398148382, -199.152114102))
            Line((-42.398148382, -199.152114102), (-42.398148382, -208.152114102))
            ThreePointArc((-42.398148382, -208.152114102), (-39.218148382, -211.332114102), (-36.038148382, -208.152114102))
        make_face(mode=Mode.SUBTRACT)
        with BuildLine():
            Line((-171.098908986, -113.963668377), (-103.018668094, -182.043909269))
            ThreePointArc((-103.018668094, -182.043909269), (-103.018668094, -186.541108398), (-98.521468965, -186.541108398))
            Line((-98.521468965, -186.541108398), (-92.157507935, -180.177147367))
            ThreePointArc((-92.157507935, -180.177147367), (-92.157507935, -175.679948239), (-96.654707063, -175.679948239))
            Line((-96.654707063, -175.679948239), (-164.734947956, -107.599707346))
            ThreePointArc((-164.734947956, -107.599707346), (-164.734947956, -103.102508218), (-169.232147084, -103.102508218))
            Line((-169.232147084, -103.102508218), (-175.596108115, -109.466469248))
            ThreePointArc((-175.596108115, -109.466469248), (-175.596108115, -113.963668377), (-171.098908986, -113.963668377))
        make_face(mode=Mode.SUBTRACT)
        with BuildLine():
            Line((-134, -88.91125497), (-66, -88.91125497))
            ThreePointArc((-66, -88.91125497), (-63, -91.91125497), (-60, -88.91125497))
            Line((-60, -88.91125497), (-60, -79.91125497))
            ThreePointArc((-60, -79.91125497), (-63, -76.91125497), (-66, -79.91125497))
            Line((-66, -79.91125497), (-134, -79.91125497))
            ThreePointArc((-134, -79.91125497), (-137, -76.91125497), (-140, -79.91125497))
            Line((-140, -79.91125497), (-140, -88.91125497))
            ThreePointArc((-140, -88.91125497), (-137, -91.91125497), (-134, -88.91125497))
        make_face(mode=Mode.SUBTRACT)
        with BuildLine():
            Line((140, -88.91125497), (140, -79.91125497))
            ThreePointArc((140, -79.91125497), (137, -76.91125497), (134, -79.91125497))
            Line((134, -79.91125497), (66, -79.91125497))
            ThreePointArc((66, -79.91125497), (63, -76.91125497), (60, -79.91125497))
            Line((60, -79.91125497), (60, -88.91125497))
            ThreePointArc((60, -88.91125497), (63, -91.91125497), (66, -88.91125497))
            Line((66, -88.91125497), (134, -88.91125497))
            ThreePointArc((134, -88.91125497), (137, -91.91125497), (140, -88.91125497))
        make_face(mode=Mode.SUBTRACT)
    extrude(amount=BOSS_EXTRUDE1_DEPTH, both=True)


solid = part.part
